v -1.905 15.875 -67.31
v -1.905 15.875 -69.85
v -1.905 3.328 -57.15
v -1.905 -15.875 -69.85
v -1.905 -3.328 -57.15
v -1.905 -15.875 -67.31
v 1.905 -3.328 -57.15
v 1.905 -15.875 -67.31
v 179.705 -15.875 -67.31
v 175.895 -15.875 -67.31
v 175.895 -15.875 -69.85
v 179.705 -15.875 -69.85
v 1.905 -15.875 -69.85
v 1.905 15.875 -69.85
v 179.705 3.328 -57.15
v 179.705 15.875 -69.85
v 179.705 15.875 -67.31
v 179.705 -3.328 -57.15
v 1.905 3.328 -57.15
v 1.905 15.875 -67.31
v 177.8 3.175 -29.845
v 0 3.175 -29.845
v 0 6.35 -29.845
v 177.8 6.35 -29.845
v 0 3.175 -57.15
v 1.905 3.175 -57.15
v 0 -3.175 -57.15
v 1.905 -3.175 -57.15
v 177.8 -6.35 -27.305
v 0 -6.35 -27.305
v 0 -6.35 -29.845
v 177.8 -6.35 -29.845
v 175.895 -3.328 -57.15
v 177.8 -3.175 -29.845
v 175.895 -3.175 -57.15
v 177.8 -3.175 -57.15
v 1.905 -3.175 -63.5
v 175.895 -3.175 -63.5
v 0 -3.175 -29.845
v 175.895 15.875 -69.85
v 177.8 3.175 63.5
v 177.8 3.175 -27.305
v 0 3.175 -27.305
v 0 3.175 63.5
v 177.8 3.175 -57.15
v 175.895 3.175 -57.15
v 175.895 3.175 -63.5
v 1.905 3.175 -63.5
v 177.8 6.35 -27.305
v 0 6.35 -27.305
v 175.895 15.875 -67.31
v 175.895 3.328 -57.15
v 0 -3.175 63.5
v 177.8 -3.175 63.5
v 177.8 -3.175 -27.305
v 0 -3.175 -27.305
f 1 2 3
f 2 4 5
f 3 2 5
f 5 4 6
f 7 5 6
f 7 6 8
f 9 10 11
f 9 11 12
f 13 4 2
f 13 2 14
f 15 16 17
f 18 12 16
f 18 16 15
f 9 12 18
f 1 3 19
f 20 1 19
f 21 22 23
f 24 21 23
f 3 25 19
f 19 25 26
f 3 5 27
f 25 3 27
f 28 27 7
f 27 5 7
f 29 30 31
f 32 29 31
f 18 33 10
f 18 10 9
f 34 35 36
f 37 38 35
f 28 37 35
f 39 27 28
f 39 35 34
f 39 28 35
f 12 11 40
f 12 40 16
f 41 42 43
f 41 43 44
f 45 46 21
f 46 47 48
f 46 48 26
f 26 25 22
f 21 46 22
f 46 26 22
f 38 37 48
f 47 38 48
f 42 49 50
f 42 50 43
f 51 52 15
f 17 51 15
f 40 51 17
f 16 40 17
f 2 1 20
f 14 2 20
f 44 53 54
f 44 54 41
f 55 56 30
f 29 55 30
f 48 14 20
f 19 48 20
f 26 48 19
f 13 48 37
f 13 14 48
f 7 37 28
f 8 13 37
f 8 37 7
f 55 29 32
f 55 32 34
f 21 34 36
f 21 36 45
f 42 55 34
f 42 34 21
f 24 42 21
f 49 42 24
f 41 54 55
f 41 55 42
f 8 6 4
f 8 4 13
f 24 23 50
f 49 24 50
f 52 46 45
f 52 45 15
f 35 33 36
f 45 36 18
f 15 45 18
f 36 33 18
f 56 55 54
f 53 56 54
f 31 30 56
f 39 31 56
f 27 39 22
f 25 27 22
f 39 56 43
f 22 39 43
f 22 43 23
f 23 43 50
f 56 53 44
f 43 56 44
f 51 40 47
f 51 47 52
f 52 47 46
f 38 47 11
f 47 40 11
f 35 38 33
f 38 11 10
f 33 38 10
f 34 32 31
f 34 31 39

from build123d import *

# Parameters (mm, degrees)
F0_W          = 6.35
F0_H          = 127
F1_DEPTH      = 177.8
F2_W          = 3.81
F2_H          = 12.7
F3_DEPTH      = 12.7
F3_DEPTH_BACK = 19.05
F4_SIZE2      = 12.5465551104
F4_SIZE       = 10.16
F4_2_SIZE2    = 12.5465551104
F4_2_SIZE     = 10.16
F4_3_SIZE2    = 12.5465551104
F4_3_SIZE     = 10.16
F5_SIZE2      = 12.5465551104
F5_SIZE       = 10.16
F7_DEPTH      = 177.8


with BuildPart() as f1:
    # F0 (on Right) → F1 (new body)
    with BuildSketch(Plane.YZ):
        Rectangle(F0_W, F0_H)
    extrude(amount=F1_DEPTH)

    # F2 (on face) → F3 (join, two sides)
    with BuildSketch(Plane.XZ.offset(3.175)) as f3_sk:
        with Locations((0, -63.5)):
            Rectangle(F2_W, F2_H)
        with Locations((177.8, -63.5)):
            Rectangle(F2_W, F2_H)
    extrude(amount=F3_DEPTH)
    extrude(f3_sk.sketch, amount=-F3_DEPTH_BACK)

    # F4
    f4_edges = [f1.edges().sort_by_distance(p)[0] for p in [
        (177.8, -15.875, -57.15),
    ]]
    f4_side = f1.faces().sort_by_distance((177.8, -15.875, -63.5))[0]
    chamfer(f4_edges, length=F4_SIZE, length2=F4_SIZE2, reference=f4_side)

    # F4#2
    f4_2_edges = [f1.edges().sort_by_distance(p)[0] for p in [
        (177.8, 15.875, -57.15),
    ]]
    f4_2_side = f1.faces().sort_by_distance((177.8, 15.875, -63.5))[0]
    chamfer(f4_2_edges, length=F4_2_SIZE, length2=F4_2_SIZE2, reference=f4_2_side)

    # F4#3
    f4_3_edges = [f1.edges().sort_by_distance(p)[0] for p in [
        (0, -15.875, -57.15),
    ]]
    f4_3_side = f1.faces().sort_by_distance((0, -15.875, -63.5))[0]
    chamfer(f4_3_edges, length=F4_3_SIZE, length2=F4_3_SIZE2, reference=f4_3_side)

    # F5
    f5_edges = [f1.edges().sort_by_distance(p)[0] for p in [
        (0, 15.875, -57.15),
    ]]
    f5_side = f1.faces().sort_by_distance((0, 15.875, -63.5))[0]
    chamfer(f5_edges, length=F5_SIZE, length2=F5_SIZE2, reference=f5_side)

    # F6 (on face) → F7 (join)
    with BuildSketch(Plane.YZ.offset(177.8)):
        Polygon((6.35, -27.305), (0, -27.305), (0, -28.575), (0, -29.845), (6.35, -29.845), align=None)
        Polygon((0, -28.575), (0, -27.305), (-6.35, -27.305), (-6.35, -29.845), (0, -29.845), align=None)
    extrude(amount=-F7_DEPTH)


solid = f1.part
